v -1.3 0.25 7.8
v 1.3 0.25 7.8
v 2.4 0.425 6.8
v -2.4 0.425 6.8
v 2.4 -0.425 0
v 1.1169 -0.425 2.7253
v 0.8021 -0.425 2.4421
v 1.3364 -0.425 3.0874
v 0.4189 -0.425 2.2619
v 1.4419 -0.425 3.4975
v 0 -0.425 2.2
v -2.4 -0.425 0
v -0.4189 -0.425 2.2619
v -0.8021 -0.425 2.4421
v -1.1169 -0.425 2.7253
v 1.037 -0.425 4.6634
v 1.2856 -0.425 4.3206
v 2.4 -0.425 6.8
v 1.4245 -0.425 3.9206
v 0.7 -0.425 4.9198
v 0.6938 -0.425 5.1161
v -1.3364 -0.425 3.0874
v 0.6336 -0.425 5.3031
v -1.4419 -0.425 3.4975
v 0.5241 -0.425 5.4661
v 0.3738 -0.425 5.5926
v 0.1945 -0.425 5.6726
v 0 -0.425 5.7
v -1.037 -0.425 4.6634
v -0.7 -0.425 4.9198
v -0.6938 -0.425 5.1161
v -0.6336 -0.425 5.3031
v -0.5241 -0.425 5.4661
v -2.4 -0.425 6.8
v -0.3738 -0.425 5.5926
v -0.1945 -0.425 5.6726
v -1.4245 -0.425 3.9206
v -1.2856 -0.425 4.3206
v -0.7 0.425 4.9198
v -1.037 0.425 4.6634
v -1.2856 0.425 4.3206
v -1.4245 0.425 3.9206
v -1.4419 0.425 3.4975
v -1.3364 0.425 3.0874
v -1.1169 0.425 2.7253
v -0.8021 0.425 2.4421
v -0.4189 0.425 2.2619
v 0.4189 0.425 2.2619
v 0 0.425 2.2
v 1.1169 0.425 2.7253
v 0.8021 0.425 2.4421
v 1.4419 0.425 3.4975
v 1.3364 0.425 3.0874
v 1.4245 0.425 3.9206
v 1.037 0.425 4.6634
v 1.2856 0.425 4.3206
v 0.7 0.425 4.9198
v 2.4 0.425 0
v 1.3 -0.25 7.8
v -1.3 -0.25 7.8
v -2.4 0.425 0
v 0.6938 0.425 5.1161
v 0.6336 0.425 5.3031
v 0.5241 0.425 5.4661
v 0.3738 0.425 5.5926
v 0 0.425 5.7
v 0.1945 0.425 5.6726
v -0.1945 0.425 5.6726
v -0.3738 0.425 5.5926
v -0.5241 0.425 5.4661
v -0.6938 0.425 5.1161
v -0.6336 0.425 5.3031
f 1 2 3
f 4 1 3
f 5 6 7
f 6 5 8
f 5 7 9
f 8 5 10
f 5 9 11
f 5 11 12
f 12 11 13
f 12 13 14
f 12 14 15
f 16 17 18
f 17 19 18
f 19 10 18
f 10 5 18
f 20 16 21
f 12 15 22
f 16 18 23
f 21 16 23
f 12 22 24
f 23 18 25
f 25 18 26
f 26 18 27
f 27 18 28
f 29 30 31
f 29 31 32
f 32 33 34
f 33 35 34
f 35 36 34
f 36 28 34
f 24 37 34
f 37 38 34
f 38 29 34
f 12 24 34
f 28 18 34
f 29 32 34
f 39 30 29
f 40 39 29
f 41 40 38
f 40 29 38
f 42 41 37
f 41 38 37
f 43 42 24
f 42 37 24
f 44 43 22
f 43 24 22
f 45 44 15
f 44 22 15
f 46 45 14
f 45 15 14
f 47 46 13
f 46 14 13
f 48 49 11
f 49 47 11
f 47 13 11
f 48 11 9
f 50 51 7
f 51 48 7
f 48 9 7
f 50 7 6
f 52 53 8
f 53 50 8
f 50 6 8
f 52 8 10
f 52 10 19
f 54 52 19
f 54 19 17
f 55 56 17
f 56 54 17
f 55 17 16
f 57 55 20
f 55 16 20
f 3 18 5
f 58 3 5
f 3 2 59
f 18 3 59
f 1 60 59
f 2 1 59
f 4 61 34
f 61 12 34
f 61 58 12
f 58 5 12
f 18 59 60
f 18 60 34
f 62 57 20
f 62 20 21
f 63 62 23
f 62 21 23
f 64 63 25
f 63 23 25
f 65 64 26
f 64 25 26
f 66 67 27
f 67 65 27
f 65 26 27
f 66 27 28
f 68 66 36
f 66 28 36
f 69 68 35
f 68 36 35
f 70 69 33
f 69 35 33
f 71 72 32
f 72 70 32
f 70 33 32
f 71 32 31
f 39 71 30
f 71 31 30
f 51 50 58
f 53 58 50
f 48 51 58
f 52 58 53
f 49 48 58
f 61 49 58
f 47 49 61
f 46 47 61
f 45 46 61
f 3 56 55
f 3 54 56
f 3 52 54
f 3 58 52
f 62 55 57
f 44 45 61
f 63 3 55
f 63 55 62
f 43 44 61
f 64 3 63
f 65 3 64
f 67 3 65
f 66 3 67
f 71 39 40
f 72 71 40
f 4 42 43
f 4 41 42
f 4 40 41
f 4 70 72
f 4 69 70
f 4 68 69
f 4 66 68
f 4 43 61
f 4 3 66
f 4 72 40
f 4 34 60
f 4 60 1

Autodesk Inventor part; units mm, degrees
ref_plane "YZ Plane" through (0, 0, 0) normal (1, 0, 0) x (0, 1, 0)
ref_plane "XZ Plane" through (0, 0, 0) normal (0, 1, 0) x (-1, 0, 0)
ref_plane "XY Plane" through (0, 0, 0) normal (0, 0, 1) x (1, 0, 0)
sketch "Sketch1" plane through (0, 0, 0) normal (0, 1, 0) x (-1, 0, 0)
  line L0 (-2.4, 0) -> (2.4, 0)
  line L1 (2.4, 0) -> (2.4, 7.8)
  line L2 (2.4, 7.8) -> (-2.4, 7.8)
  line L3 (-2.4, 7.8) -> (-2.4, 0)
  arc A0 (-0.7, 4.9198) -> (0.7, 4.9198) centre (0, 3.65) ccw
  arc A1 (0.7, 4.9198) -> (-0.7, 4.9198) centre (0, 4.9959) ccw
  point P0 (0, 0)
  point P1 (0, 7.8)
  point P2 (0, 0)
  dimension "d0" = 4.8
  dimension "d1" = 7.8
  dimension "d2" = 5.6
  dimension "d3" = 1.45
  dimension "d4" = 2.1
  dimension "d5" = 1.4
extrude "Extrusion1" add sketch "Sketch1" along normal mid plane 0.85
chamfer "Chamfer1" distance 1.1 distance2 1 1 edges at (2.4, 0, 7.8) measured on face at (-0.8, -0.1417, 7.8)
chamfer "Chamfer2" distance 1.1 distance2 1 1 edges at (-2.4, 0, 7.8) measured on face at (0.0667, 0.1417, 7.8)
chamfer "Chamfer3" distance 1 distance2 0.175 1 edges at (0, 0.425, 7.8) measured on face at (0, 0.425, 0.7333)
chamfer "Chamfer4" distance 1 distance2 0.175 1 edges at (0, -0.425, 7.8) measured on face at (0, -0.425, 0.7333)
properties material "Nickel-Copper Alloy 400"
